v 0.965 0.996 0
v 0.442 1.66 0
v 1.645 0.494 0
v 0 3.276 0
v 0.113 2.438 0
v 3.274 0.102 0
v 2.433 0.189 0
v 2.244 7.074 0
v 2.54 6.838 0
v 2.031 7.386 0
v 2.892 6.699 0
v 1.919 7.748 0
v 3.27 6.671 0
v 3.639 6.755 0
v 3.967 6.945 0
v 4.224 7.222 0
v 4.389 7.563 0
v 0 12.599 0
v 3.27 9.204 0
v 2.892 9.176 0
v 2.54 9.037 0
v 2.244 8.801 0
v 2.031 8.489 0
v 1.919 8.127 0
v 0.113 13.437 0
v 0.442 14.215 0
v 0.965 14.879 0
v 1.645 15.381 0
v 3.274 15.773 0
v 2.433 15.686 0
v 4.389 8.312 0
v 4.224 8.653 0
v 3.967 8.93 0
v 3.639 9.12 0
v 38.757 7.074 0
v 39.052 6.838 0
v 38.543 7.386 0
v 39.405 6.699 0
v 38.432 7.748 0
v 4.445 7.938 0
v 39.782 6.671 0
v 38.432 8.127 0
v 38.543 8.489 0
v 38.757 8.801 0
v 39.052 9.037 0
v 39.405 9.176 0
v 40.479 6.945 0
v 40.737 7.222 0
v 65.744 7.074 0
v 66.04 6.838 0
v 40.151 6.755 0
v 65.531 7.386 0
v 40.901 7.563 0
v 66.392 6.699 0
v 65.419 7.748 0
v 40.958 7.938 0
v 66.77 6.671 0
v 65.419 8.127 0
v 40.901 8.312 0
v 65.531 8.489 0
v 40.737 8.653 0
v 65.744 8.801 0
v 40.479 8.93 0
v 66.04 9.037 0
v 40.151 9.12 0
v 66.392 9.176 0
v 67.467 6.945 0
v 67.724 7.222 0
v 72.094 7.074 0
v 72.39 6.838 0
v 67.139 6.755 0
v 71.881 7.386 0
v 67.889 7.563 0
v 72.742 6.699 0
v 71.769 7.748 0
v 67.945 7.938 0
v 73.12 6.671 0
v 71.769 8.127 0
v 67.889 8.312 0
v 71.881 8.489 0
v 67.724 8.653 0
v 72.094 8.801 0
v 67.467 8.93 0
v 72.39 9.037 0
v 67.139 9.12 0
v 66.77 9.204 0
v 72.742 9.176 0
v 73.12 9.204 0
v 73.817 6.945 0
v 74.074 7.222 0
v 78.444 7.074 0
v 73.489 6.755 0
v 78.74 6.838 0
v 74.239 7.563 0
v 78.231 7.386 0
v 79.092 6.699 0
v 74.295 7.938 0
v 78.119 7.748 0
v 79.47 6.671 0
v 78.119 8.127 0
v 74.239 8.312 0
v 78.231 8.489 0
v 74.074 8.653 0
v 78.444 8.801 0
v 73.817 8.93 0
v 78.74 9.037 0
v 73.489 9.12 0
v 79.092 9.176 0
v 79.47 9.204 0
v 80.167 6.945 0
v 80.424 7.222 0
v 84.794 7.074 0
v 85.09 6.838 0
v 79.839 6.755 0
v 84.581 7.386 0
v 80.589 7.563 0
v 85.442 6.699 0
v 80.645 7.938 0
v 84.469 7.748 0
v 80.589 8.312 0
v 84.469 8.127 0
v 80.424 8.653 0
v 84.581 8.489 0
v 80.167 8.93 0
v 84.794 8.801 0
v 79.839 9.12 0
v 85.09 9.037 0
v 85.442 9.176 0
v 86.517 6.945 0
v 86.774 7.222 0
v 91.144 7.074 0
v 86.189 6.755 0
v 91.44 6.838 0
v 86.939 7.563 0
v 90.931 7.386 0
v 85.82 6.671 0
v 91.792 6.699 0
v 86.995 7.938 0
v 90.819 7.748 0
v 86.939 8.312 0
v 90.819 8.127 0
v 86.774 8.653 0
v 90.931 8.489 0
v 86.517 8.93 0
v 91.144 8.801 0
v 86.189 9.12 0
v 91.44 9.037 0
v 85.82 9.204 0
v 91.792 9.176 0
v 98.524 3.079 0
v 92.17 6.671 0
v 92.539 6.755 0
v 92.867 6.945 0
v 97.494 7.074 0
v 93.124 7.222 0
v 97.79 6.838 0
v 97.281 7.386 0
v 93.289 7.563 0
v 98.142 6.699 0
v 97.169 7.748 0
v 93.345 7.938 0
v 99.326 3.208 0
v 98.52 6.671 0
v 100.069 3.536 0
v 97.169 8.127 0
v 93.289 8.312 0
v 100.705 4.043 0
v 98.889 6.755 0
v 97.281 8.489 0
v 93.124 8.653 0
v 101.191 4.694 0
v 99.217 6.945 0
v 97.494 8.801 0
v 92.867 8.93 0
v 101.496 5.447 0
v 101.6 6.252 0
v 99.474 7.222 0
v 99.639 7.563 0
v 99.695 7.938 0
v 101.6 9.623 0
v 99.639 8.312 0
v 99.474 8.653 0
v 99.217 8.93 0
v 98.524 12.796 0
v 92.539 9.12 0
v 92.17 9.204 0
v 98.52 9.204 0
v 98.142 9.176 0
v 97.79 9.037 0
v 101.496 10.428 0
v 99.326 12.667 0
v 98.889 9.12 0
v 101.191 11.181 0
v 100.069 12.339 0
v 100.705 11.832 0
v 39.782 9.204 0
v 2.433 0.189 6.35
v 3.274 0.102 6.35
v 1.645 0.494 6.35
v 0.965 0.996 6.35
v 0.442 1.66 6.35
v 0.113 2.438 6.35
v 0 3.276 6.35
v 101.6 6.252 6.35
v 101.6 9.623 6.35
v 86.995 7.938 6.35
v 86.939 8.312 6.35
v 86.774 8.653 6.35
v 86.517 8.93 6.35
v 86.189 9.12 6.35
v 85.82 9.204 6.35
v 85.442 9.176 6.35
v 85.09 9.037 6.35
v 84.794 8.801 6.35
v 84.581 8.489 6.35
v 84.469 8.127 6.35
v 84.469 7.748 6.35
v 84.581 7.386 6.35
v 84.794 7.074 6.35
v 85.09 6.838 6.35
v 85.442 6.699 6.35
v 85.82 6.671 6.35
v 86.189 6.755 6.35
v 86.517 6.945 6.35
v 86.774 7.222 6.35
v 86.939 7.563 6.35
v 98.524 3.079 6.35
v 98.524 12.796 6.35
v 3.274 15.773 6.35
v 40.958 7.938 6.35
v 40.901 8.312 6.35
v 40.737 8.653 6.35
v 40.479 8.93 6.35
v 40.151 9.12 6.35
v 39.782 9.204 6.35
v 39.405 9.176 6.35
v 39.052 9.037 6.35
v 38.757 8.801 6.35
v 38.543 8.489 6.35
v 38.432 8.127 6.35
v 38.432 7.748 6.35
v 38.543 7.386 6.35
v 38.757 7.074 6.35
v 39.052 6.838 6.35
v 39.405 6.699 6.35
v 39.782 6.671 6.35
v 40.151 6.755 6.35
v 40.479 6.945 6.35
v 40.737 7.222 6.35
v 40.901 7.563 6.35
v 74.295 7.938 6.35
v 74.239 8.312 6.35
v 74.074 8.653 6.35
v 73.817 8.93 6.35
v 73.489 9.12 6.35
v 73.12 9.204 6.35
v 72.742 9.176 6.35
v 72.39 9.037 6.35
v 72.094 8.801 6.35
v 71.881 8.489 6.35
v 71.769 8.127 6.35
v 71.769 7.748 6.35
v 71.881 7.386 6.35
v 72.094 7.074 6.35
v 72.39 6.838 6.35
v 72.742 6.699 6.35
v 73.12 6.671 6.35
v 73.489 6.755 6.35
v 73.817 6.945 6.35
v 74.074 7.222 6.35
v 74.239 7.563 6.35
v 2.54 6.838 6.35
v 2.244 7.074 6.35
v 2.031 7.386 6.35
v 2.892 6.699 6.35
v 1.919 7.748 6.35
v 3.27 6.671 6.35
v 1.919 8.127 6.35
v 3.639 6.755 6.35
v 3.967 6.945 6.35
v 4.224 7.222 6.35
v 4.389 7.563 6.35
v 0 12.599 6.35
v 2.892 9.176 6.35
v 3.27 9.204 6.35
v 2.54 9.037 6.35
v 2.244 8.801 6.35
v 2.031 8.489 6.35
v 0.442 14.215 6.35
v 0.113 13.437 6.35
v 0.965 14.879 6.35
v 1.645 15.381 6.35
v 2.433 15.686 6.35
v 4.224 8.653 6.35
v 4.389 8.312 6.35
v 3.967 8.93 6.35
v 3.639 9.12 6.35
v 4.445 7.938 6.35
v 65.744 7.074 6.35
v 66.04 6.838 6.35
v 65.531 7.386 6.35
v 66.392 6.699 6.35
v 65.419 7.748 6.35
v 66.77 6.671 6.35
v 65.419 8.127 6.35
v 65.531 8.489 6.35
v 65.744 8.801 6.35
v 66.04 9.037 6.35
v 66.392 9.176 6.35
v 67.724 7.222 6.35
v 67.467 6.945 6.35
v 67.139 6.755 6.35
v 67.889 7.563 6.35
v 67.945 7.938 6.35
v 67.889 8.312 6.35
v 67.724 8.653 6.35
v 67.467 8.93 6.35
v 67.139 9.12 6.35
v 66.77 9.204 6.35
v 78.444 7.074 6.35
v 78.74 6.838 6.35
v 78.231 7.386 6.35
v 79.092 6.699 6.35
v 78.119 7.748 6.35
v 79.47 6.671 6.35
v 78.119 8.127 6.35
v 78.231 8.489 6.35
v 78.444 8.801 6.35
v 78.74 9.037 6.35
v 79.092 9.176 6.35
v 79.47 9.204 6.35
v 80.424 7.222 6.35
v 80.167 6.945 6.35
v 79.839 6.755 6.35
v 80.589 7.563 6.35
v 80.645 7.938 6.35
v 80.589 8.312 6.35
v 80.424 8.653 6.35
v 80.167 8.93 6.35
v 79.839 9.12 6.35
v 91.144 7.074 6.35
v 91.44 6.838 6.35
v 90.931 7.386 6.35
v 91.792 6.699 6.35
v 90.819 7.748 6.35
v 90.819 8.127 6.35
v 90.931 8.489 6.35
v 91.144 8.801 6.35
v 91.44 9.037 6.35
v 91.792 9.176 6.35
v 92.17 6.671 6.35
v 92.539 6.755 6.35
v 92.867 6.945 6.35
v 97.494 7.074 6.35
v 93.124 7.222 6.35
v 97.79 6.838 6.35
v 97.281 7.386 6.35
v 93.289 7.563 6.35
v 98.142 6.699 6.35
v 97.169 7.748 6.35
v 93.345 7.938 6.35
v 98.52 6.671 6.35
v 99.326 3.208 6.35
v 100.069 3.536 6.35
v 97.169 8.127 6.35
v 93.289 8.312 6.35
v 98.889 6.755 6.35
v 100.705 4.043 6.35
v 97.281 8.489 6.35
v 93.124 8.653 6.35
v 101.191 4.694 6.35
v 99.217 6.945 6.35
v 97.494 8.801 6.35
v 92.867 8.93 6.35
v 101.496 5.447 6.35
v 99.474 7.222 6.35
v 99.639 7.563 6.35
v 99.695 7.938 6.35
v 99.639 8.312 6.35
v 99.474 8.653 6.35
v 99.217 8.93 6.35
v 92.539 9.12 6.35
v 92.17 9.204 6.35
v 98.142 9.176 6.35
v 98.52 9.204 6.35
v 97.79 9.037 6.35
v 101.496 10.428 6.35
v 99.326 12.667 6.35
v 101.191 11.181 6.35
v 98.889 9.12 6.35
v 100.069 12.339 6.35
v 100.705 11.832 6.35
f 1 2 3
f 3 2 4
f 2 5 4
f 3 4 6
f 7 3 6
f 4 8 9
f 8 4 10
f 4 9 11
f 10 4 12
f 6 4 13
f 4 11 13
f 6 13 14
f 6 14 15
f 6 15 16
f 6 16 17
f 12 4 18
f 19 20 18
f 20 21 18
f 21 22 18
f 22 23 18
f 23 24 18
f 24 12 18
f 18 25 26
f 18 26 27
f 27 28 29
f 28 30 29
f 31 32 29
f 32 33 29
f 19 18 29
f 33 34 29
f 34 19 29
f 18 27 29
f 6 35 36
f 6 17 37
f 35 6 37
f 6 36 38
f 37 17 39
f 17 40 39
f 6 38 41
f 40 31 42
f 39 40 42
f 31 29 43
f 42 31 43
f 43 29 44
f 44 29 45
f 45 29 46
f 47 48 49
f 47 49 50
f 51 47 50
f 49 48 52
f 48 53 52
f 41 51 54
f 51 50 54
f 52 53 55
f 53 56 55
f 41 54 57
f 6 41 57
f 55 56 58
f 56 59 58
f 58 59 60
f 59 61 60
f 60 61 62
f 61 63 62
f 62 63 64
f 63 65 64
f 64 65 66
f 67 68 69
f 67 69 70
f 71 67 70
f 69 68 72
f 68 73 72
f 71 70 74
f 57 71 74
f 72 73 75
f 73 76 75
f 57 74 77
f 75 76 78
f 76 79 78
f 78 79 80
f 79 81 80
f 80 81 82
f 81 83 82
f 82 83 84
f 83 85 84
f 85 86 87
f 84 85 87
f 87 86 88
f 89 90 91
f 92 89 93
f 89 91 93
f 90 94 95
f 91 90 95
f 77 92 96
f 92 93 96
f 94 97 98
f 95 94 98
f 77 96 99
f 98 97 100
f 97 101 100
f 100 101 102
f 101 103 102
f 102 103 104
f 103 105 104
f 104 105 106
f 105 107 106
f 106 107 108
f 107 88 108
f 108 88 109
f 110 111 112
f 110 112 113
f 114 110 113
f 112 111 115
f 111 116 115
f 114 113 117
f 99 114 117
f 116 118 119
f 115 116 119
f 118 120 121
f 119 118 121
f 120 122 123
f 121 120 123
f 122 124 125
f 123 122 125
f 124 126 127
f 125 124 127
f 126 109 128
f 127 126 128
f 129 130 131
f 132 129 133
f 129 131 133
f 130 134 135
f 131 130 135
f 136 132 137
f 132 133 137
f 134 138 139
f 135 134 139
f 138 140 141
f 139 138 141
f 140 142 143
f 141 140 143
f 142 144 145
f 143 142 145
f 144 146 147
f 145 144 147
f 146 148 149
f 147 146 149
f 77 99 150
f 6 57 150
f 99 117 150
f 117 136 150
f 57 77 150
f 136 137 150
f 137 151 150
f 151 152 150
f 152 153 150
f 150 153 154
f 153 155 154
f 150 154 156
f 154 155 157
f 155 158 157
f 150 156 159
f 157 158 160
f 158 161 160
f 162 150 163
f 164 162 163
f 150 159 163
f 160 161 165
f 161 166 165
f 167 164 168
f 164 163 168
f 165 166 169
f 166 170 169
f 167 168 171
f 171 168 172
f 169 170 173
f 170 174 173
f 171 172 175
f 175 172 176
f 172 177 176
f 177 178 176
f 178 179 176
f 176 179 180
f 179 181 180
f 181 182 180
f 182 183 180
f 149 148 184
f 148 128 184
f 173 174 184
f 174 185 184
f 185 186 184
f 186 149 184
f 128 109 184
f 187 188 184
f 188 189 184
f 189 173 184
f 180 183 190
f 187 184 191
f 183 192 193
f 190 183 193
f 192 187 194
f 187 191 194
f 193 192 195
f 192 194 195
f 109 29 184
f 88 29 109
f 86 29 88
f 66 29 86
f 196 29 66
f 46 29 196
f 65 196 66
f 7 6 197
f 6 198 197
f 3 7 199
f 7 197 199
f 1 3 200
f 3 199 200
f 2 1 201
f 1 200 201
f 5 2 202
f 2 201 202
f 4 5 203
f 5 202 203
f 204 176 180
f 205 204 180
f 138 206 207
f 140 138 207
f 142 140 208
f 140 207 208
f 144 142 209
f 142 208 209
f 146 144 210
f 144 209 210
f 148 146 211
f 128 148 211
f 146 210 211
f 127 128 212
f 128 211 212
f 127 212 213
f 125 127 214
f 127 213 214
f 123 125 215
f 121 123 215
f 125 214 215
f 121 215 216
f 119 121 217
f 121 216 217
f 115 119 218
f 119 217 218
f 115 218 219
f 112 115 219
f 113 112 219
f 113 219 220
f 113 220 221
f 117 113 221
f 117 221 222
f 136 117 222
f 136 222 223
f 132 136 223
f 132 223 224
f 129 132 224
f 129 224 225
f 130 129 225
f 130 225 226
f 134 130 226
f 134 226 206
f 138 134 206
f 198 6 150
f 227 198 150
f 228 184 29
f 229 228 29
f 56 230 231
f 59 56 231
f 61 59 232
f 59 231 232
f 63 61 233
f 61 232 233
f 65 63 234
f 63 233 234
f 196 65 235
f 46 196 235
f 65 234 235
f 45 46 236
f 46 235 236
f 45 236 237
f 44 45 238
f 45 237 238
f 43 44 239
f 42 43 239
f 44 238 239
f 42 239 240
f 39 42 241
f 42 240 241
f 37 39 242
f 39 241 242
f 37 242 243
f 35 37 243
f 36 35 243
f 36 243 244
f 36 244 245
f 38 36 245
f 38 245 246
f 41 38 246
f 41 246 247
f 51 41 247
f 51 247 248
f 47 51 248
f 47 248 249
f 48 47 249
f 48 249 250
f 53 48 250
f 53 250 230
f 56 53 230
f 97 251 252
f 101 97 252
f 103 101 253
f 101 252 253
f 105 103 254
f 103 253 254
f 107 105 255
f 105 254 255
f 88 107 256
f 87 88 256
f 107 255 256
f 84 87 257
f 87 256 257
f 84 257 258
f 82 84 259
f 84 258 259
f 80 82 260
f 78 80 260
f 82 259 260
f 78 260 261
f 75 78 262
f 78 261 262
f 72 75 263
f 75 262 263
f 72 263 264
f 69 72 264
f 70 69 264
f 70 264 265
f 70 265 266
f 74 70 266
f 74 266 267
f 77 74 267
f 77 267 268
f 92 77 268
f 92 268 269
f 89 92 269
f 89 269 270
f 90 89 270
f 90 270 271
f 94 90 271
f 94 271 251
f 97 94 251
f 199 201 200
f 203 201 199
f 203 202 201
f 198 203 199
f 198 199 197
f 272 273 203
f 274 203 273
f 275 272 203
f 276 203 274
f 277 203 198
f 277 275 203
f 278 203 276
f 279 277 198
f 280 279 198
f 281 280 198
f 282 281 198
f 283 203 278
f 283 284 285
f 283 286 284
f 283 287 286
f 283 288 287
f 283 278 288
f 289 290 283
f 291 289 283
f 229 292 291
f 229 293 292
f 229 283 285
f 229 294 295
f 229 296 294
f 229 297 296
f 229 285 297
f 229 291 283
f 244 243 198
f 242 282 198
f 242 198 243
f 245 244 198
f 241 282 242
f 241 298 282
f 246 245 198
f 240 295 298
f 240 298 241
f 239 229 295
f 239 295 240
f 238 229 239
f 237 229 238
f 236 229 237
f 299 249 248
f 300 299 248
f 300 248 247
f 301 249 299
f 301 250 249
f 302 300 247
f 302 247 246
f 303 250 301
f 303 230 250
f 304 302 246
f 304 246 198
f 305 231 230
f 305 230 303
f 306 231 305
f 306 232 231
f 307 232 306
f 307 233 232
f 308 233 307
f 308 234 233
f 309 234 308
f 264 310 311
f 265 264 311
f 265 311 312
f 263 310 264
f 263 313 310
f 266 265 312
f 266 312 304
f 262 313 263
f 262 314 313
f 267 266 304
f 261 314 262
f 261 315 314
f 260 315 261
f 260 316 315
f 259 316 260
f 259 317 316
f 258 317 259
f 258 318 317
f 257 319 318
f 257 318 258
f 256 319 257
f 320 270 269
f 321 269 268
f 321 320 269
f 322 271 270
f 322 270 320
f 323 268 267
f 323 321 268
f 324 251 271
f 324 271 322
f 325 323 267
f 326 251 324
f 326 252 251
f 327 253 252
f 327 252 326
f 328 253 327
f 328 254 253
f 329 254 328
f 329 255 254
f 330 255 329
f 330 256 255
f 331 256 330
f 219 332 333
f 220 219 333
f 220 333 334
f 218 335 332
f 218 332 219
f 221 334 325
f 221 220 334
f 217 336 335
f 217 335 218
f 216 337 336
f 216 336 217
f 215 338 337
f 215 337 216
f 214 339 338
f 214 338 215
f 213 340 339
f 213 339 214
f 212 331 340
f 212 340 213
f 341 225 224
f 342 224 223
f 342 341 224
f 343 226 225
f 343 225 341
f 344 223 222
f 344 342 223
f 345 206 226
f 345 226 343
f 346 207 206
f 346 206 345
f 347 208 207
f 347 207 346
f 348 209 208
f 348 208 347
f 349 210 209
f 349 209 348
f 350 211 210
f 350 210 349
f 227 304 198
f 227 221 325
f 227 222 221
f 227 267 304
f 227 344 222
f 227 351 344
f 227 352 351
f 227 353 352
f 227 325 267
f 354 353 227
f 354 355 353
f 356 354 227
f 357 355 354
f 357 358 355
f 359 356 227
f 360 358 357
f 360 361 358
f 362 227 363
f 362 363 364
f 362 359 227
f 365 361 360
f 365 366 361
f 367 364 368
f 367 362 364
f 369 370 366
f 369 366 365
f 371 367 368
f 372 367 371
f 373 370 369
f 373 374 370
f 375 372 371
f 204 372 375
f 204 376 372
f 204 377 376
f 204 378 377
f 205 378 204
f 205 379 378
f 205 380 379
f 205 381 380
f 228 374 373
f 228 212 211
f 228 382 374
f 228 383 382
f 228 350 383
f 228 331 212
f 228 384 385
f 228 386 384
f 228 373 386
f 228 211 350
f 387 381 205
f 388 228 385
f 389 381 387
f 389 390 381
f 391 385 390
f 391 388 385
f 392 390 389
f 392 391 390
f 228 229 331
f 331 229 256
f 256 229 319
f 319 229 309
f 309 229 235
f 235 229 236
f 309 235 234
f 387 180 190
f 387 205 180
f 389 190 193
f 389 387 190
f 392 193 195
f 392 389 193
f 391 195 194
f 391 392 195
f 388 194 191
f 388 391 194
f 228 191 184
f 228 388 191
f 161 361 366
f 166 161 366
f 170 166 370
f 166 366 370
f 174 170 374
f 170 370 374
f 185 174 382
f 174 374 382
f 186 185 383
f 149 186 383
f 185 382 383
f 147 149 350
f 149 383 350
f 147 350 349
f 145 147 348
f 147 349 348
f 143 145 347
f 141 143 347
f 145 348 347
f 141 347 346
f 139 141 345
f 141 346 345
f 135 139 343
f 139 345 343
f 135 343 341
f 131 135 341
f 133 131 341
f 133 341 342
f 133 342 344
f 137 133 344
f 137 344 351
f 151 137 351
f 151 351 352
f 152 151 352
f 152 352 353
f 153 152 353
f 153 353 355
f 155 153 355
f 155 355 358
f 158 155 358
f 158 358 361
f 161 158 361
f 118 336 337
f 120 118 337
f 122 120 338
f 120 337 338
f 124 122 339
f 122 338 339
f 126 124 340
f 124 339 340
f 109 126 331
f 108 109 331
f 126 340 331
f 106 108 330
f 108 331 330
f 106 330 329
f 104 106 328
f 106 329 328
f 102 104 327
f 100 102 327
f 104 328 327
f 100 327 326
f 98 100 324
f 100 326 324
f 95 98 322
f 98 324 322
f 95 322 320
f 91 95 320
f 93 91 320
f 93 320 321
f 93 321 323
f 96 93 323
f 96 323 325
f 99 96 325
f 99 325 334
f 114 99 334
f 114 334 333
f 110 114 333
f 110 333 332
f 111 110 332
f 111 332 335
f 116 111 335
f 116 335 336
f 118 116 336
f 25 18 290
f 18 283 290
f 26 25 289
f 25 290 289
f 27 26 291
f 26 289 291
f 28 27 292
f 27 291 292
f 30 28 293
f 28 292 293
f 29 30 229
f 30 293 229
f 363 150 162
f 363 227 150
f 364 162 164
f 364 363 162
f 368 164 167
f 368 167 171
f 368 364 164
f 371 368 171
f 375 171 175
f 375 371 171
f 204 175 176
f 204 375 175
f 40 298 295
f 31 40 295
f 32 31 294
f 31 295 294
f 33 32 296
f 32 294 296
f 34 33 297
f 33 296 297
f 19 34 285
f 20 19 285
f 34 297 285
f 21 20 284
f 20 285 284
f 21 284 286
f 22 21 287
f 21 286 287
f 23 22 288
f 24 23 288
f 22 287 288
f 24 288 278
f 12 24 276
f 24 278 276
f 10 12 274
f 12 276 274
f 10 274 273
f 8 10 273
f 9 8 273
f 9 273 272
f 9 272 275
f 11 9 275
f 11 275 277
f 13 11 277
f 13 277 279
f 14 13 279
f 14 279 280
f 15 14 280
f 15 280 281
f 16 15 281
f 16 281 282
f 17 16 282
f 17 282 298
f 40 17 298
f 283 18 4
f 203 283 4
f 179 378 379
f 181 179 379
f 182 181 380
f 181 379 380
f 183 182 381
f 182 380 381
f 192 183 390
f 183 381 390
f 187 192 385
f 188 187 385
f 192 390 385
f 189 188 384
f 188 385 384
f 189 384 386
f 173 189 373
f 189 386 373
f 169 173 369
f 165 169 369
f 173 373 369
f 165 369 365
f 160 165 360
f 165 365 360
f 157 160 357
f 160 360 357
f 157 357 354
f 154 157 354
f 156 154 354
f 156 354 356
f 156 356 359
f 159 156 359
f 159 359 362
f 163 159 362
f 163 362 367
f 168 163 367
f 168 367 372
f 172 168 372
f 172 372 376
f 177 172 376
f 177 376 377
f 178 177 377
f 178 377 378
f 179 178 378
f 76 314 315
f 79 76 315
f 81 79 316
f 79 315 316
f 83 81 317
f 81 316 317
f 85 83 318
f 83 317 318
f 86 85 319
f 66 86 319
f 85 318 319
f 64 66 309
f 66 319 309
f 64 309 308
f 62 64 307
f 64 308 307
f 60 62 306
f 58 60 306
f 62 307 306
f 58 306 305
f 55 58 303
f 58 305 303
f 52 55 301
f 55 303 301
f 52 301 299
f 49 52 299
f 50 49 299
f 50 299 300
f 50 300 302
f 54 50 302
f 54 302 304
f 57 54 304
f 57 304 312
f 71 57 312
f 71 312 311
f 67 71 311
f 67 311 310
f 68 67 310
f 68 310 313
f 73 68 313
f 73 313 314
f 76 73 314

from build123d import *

# Parameters (mm, degrees)
BOSS_EXTRUDE1_DEPTH = 6.35
SKETCH2_R           = 1.27
CUT_EXTRUDE1_DEPTH  = 7.35
LPATTERN1_COUNT     = 6
LPATTERN1_PITCH     = 6.35
SKETCH4_R           = 1.27
CUT_EXTRUDE2_DEPTH  = 7.35
FILLET1_R           = 3.175


with BuildPart() as part:
    # Sketch1 → Boss-Extrude1 (new body)
    with BuildSketch(Plane.XY):
        Polygon((0, 0), (101.6, 3.175), (101.6, 12.7), (0, 15.875), align=None)
    extrude(amount=BOSS_EXTRUDE1_DEPTH)

    # Sketch2 → Cut-Extrude1 (cut, through all)
    with BuildSketch(Plane.XY.offset(6.35)):
        with Locations((98.425, 7.9375)):
            Circle(SKETCH2_R)
    cut_extrude1 = extrude(amount=-CUT_EXTRUDE1_DEPTH, mode=Mode.SUBTRACT)

    # LPattern1: Cut-Extrude1 ×6
    with Locations(*[(-i * LPATTERN1_PITCH, 0, 0) for i in range(1, LPATTERN1_COUNT)]):
        add(cut_extrude1, mode=Mode.SUBTRACT)

    # Sketch4 → Cut-Extrude2 (cut, through all)
    with BuildSketch(Plane.XY.offset(6.35)):
        with Locations((3.175, 7.9375)):
            Circle(SKETCH4_R)
        with Locations((39.6875, 7.9375)):
            Circle(SKETCH4_R)
    extrude(amount=-CUT_EXTRUDE2_DEPTH, mode=Mode.SUBTRACT)

    # Fillet1
    fillet1_edges = [part.edges().sort_by_distance(p)[0] for p in [
        (0, 15.875, 3.175),
        (101.6, 12.7, 3.175),
        (101.6, 3.175, 3.175),
        (0, 0, 3.175),
    ]]
    fillet(fillet1_edges, radius=FILLET1_R)


solid = part.part
